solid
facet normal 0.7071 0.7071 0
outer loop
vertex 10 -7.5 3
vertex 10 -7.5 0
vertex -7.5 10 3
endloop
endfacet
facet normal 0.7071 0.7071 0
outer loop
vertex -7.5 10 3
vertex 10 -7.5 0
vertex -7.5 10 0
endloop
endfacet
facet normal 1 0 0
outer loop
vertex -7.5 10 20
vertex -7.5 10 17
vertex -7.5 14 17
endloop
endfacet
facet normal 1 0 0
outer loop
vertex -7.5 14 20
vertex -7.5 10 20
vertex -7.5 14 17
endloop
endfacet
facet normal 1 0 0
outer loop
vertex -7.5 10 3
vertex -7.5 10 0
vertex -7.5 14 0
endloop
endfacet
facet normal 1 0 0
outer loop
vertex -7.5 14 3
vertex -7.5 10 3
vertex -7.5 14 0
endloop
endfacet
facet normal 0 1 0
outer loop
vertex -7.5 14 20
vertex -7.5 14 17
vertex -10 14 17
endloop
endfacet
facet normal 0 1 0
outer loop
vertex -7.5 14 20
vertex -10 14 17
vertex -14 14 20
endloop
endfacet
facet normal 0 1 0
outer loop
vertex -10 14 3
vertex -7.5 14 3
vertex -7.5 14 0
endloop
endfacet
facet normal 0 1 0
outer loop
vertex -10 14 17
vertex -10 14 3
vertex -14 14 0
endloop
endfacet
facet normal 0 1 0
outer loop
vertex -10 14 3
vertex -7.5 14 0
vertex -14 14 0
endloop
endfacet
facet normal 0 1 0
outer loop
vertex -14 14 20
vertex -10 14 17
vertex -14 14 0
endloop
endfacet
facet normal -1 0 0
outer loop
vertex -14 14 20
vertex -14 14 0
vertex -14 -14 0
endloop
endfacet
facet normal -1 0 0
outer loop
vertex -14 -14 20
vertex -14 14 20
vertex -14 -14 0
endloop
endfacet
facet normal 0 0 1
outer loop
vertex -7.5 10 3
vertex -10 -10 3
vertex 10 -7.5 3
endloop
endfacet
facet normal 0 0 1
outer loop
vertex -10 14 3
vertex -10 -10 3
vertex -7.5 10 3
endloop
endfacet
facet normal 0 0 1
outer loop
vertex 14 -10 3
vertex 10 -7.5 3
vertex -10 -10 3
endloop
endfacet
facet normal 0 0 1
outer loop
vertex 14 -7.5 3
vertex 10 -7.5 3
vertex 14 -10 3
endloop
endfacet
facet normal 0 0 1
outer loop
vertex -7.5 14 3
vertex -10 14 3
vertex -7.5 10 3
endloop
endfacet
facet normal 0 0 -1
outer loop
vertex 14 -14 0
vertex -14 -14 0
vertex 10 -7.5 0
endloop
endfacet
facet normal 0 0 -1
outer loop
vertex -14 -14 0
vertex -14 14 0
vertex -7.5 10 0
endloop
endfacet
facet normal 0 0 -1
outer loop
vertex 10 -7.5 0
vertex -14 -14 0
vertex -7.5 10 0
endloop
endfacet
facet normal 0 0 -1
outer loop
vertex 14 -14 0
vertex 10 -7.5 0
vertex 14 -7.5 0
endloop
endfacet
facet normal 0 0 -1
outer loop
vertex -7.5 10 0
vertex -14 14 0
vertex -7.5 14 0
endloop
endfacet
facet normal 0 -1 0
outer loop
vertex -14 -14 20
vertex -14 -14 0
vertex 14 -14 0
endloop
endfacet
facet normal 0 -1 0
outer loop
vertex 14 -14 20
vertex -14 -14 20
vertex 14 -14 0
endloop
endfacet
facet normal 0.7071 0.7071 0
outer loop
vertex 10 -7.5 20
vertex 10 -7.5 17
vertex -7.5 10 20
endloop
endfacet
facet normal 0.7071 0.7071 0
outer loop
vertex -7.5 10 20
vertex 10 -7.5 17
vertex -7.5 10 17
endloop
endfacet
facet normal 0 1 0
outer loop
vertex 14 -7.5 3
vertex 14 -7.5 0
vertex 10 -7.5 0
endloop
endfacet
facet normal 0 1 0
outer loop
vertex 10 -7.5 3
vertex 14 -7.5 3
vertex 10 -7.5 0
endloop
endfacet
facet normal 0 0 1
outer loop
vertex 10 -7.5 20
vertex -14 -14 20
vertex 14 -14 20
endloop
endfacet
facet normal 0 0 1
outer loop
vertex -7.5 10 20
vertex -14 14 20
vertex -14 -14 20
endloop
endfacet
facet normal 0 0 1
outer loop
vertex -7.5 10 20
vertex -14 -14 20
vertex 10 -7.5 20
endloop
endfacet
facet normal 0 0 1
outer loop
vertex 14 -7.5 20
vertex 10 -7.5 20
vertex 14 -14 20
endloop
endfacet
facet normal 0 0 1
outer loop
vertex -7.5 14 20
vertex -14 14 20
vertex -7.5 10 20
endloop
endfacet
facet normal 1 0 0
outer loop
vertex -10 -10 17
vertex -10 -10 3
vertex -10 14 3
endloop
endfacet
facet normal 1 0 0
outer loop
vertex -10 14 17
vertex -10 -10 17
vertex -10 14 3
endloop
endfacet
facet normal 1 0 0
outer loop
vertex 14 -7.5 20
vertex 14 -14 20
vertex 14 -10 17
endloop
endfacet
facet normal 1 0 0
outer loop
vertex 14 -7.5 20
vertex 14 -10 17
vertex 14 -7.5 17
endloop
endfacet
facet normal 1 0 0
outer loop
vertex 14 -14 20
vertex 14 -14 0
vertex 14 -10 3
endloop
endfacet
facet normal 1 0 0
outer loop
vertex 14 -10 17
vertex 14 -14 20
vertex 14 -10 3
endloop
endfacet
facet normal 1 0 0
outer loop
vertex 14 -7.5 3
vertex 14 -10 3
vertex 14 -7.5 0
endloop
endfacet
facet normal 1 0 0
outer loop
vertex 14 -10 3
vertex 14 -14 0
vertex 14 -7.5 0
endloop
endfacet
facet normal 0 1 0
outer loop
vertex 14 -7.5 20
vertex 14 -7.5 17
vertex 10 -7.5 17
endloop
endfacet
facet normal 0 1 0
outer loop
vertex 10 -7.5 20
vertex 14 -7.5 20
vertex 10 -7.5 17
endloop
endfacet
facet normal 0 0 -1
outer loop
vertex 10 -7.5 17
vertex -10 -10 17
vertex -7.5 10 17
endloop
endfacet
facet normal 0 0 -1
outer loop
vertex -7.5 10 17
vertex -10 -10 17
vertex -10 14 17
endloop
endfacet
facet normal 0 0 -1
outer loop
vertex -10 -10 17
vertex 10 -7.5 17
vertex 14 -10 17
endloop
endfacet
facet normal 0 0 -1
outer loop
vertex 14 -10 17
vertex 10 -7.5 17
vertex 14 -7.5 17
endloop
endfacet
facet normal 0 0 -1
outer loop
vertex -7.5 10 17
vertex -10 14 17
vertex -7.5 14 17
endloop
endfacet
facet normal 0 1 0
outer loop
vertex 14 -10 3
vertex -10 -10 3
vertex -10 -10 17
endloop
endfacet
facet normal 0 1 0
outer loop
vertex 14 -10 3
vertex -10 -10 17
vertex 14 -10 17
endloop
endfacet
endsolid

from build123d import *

# Parameters (mm, degrees)
EXTRUDE_1_DEPTH     = 20
CUT_EXTRUDE_START   = 3
SKETCH_2_W          = 25.638251078
SKETCH_2_H          = 25.026937626
CUT_EXTRUDE_1_DEPTH = 14


with BuildPart() as part:
    # 草图1 → 凸台-拉伸1 (new body)
    with BuildSketch(Plane.XY):
        Polygon((14, -7.5), (10, -7.5), (-7.5, 10), (-7.5, 14), (-14, 14), (-14, -14), (14, -14), align=None)
    extrude(amount=EXTRUDE_1_DEPTH)

    # 草图2 → 切除-拉伸1 (cut)
    with BuildSketch(Plane.XY.offset(CUT_EXTRUDE_START)):
        with Locations((2.819125539, 2.513468813)):
            Rectangle(SKETCH_2_W, SKETCH_2_H)
    extrude(amount=CUT_EXTRUDE_1_DEPTH, mode=Mode.SUBTRACT)


solid = part.part
